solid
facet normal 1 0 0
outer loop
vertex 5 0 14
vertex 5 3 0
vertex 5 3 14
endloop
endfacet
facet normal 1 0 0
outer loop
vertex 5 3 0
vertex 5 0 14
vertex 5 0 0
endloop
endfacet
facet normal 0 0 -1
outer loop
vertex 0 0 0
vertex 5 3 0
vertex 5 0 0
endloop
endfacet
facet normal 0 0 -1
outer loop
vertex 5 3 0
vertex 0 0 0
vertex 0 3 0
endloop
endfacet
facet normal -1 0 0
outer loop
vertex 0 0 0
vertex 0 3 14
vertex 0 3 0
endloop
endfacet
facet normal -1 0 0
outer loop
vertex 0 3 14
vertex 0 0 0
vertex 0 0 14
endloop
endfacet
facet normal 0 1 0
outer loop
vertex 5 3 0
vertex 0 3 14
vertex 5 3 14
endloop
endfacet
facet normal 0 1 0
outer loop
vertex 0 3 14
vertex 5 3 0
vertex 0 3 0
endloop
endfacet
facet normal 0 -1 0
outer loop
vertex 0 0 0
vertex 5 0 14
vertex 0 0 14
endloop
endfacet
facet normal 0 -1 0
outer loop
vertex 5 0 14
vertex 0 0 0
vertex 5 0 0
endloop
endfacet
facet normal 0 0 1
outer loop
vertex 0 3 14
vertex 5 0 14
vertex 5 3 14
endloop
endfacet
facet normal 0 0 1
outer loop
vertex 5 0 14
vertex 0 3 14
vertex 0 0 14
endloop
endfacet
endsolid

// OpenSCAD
translate([2.5, 1.5, 1.0]) color([0.14090487727396894, 0.8899614875266342, 0.6019667067914363]) cube([5, 3, 2], center=true);
translate([2.5, 1.5, 3.0]) color([0.08161964024263468, 0.6986964058233333, 0.8102884962164306]) cube([5, 3, 2], center=true);
translate([2.5, 1.5, 5.0]) color([0.3527718366022422, 0.03517979094215373, 0.4662789582213983]) cube([5, 3, 2], center=true);
translate([2.5, 1.5, 7.0]) color([0.458882332198567, 0.10148050986892876, 0.7781483542276006]) cube([5, 3, 2], center=true);
translate([2.5, 1.5, 9.0]) color([0.02022807324279441, 0.5983002604350479, 0.13270195297871745]) cube([5, 3, 2], center=true);
translate([2.5, 1.5, 11.0]) color([0.3239113547302247, 0.7000796910311562, 0.6489922579129634]) cube([5, 3, 2], center=true);
translate([2.5, 1.5, 13.0]) color([0.19497362064878687, 0.7834169698984913, 0.7774609885388588]) cube([5, 3, 2], center=true);
